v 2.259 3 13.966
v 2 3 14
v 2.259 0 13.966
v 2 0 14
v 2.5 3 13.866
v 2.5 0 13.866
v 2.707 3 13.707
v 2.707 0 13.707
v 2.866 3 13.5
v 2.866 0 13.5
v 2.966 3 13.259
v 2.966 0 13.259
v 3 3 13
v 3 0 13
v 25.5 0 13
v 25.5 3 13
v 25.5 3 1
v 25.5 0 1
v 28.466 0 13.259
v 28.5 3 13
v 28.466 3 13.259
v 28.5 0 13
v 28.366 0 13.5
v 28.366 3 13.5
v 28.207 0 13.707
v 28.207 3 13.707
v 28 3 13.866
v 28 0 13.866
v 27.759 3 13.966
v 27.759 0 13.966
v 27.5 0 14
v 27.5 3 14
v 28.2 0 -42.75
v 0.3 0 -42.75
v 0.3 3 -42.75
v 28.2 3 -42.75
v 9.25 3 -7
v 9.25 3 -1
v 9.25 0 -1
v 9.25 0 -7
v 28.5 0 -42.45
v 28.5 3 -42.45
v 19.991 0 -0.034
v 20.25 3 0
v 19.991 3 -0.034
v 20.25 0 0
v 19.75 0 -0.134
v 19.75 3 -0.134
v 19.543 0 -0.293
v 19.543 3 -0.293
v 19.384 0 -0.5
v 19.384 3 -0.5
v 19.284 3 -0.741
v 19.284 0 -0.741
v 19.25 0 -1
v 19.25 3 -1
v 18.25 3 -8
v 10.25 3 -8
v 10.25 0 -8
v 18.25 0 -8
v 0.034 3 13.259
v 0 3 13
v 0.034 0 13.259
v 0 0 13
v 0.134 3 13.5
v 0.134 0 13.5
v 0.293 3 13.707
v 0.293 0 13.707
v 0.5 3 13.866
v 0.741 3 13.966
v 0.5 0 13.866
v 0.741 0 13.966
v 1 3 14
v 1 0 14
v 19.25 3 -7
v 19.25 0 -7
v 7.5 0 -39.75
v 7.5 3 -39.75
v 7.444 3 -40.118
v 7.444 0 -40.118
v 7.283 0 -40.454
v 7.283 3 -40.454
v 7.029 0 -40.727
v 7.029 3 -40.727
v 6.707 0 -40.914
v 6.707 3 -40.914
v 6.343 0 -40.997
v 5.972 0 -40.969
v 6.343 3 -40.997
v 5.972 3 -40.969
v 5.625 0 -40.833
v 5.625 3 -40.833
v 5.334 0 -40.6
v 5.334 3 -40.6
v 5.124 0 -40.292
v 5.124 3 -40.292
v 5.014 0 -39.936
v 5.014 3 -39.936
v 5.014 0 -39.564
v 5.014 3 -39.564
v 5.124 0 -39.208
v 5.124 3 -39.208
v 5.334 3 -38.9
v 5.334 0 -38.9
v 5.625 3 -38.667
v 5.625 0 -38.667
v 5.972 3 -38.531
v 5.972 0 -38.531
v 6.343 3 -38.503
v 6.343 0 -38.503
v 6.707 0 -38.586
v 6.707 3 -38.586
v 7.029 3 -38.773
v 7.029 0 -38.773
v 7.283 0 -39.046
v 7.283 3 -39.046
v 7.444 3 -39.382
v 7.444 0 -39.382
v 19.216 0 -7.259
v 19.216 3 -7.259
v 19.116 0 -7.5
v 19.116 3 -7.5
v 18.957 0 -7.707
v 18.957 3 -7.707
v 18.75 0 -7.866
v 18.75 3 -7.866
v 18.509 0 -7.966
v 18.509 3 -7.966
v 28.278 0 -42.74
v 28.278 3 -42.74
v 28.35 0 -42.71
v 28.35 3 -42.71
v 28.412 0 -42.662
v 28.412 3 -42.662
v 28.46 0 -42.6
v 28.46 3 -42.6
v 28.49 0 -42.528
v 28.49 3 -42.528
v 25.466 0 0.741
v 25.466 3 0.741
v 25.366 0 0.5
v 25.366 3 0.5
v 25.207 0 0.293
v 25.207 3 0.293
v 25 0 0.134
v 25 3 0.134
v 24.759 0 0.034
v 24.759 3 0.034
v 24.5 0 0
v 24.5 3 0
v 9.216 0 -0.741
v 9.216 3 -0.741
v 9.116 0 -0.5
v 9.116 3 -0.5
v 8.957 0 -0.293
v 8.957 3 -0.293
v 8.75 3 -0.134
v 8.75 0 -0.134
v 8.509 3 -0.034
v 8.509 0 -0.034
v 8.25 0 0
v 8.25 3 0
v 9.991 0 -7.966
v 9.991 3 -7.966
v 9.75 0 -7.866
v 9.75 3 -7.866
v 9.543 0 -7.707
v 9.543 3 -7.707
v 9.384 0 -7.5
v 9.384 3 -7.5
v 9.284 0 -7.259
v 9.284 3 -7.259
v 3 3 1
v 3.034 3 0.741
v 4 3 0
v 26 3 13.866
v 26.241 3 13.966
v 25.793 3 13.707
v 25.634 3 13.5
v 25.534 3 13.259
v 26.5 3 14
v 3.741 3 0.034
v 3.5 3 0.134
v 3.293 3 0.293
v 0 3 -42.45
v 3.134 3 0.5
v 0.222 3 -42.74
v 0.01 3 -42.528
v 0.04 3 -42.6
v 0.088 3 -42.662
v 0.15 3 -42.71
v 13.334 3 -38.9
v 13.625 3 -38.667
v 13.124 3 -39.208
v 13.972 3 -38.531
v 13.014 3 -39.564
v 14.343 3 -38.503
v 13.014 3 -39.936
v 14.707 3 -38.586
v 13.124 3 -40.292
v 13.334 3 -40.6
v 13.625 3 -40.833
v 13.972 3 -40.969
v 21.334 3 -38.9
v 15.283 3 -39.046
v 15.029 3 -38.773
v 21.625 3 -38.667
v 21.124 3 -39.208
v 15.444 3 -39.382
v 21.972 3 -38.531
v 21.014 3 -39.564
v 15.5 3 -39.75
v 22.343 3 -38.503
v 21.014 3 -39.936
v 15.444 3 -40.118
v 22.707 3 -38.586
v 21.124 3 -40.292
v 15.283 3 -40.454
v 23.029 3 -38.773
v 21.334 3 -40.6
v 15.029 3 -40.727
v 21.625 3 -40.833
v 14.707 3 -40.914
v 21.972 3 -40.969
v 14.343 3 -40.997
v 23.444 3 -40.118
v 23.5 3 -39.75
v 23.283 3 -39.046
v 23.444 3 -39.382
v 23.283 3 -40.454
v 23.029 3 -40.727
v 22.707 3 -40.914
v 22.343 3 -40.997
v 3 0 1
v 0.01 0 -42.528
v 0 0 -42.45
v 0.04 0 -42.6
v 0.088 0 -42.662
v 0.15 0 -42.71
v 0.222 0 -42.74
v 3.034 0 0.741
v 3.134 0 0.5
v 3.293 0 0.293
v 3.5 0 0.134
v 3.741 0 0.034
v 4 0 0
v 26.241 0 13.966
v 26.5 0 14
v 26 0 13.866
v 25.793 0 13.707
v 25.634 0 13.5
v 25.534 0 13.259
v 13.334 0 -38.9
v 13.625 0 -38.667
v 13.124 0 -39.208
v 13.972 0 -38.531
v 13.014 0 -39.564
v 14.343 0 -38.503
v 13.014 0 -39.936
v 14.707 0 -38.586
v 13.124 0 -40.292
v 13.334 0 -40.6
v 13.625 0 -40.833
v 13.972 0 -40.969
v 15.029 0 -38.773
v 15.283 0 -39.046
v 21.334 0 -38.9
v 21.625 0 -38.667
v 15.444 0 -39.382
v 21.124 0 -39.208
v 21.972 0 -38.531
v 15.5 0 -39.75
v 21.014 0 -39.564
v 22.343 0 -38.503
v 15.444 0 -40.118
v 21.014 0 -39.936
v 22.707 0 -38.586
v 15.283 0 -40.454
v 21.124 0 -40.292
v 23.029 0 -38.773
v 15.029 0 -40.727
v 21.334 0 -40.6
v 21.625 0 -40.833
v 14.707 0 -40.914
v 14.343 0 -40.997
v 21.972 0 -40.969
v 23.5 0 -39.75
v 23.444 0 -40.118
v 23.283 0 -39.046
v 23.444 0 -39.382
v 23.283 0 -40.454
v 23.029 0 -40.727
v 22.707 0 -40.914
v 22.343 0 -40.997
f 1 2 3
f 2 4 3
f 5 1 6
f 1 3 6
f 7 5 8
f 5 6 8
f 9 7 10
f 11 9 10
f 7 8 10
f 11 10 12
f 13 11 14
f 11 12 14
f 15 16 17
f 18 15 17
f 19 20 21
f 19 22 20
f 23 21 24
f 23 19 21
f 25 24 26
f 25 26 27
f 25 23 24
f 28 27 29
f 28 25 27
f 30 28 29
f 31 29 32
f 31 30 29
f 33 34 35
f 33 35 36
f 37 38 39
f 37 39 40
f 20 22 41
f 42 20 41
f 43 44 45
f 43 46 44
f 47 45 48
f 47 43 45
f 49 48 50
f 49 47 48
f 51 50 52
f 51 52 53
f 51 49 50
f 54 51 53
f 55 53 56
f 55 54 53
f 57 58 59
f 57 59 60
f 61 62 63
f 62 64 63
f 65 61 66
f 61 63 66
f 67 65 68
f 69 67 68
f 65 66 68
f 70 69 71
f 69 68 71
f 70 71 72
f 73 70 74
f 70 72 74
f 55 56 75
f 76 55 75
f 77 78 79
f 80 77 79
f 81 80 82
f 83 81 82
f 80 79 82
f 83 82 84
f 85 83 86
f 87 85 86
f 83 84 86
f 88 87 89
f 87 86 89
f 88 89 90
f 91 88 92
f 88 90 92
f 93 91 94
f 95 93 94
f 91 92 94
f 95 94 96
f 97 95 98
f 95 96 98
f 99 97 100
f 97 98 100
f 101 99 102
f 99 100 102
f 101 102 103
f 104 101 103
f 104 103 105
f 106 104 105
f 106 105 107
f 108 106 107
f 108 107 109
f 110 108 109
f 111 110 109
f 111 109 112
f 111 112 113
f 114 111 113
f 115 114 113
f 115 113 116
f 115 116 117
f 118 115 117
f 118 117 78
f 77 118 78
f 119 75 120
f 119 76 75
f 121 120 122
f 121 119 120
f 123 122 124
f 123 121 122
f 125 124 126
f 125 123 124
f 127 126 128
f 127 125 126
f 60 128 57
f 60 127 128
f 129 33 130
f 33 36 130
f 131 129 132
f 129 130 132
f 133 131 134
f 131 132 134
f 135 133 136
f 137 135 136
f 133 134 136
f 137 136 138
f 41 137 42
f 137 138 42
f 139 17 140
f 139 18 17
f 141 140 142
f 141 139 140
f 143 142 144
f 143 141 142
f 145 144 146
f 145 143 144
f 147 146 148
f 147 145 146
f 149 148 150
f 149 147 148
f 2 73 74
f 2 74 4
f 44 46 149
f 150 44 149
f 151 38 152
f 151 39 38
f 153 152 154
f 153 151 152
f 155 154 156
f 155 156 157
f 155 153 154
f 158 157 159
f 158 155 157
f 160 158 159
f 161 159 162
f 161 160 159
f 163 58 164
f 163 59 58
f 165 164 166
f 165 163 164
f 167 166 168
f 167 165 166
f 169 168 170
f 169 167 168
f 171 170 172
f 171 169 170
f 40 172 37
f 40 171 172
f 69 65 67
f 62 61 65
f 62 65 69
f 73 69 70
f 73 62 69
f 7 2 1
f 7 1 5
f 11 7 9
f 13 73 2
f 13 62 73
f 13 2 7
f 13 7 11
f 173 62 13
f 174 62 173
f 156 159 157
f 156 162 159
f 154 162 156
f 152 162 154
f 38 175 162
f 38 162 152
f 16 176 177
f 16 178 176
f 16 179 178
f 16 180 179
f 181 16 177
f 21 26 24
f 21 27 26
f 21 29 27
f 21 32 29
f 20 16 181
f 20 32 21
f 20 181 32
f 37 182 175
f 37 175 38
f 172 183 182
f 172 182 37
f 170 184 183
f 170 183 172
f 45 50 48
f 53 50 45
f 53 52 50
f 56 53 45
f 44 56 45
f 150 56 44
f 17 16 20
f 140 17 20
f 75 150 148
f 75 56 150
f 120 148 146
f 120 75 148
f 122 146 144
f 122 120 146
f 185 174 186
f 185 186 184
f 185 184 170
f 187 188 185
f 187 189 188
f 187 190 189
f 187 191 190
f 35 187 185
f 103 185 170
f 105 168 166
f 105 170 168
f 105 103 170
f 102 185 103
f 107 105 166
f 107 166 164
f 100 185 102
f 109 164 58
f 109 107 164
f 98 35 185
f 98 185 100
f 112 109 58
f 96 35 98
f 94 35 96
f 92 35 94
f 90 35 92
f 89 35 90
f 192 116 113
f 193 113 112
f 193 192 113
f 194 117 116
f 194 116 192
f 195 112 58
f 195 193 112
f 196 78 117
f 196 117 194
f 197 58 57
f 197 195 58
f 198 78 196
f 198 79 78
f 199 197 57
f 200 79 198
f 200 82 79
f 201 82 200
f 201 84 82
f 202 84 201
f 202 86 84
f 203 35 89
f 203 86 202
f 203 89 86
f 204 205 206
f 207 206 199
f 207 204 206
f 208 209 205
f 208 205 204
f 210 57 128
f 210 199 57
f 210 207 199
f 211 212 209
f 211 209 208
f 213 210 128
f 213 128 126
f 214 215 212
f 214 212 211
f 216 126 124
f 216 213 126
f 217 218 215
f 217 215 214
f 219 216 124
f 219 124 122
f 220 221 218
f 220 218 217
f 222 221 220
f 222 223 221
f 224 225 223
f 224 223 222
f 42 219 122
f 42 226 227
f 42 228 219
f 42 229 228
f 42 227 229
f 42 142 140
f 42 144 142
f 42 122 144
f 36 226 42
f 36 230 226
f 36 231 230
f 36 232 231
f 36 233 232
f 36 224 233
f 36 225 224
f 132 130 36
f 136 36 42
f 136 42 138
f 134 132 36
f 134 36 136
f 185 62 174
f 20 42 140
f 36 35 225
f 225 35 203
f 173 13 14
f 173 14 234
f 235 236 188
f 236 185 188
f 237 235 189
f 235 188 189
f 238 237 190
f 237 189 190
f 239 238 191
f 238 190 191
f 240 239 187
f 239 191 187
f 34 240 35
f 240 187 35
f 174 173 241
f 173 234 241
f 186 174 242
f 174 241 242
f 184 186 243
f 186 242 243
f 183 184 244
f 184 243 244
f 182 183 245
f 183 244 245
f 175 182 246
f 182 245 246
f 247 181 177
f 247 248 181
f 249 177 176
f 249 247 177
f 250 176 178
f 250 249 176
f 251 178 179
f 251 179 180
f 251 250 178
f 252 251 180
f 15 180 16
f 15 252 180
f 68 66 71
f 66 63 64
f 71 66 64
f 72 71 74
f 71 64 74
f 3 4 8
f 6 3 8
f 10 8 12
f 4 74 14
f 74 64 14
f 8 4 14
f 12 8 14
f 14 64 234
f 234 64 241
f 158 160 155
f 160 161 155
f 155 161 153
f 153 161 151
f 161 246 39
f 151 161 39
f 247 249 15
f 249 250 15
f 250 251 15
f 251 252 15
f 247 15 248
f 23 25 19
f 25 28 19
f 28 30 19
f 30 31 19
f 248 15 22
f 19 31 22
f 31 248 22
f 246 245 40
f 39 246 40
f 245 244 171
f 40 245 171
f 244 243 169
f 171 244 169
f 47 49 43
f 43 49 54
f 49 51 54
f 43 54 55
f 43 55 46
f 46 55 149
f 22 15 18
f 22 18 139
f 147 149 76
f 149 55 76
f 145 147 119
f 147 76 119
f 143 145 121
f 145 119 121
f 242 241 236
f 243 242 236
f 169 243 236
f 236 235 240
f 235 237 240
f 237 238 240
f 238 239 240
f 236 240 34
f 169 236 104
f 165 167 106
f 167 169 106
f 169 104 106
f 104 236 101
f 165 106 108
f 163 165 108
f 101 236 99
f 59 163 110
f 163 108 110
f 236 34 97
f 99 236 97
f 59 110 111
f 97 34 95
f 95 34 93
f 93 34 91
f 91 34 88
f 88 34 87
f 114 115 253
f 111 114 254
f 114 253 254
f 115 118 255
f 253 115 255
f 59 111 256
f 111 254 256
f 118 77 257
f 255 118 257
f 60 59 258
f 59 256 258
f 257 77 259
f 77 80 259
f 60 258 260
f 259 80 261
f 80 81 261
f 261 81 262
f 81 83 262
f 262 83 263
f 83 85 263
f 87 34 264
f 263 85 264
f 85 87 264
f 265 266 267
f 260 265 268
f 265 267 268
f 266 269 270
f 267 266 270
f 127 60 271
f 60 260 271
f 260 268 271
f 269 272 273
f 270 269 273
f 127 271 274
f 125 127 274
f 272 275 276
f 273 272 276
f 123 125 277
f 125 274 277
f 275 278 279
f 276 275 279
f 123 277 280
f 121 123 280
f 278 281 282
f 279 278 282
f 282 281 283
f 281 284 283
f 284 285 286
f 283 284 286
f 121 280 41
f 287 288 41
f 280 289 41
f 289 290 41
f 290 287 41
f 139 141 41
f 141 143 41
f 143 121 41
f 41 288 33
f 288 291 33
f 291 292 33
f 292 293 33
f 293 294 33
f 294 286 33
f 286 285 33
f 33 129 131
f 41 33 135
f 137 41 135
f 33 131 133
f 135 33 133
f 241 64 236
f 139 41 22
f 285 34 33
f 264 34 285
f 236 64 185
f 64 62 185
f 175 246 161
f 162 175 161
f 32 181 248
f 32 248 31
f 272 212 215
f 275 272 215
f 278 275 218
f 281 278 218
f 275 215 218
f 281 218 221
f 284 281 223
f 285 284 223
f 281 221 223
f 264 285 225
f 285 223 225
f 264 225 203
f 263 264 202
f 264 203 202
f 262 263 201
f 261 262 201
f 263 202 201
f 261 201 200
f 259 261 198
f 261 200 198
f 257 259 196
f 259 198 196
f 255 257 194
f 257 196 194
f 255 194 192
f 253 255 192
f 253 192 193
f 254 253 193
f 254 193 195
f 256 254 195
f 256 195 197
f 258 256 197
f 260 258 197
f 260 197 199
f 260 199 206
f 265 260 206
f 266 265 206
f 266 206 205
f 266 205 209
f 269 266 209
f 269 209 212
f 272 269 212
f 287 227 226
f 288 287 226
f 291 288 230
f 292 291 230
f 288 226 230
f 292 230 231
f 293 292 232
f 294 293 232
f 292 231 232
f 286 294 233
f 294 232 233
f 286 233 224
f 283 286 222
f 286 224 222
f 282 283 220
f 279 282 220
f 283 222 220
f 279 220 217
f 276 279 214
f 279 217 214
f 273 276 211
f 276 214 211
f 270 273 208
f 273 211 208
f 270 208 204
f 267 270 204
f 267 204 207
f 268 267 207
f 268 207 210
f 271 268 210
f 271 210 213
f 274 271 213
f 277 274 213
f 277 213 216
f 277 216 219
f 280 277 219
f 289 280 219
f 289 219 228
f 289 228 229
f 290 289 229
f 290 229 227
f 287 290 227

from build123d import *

# Parameters (mm, degrees)
SKETCH1_W             = 28.5
SKETCH1_H             = 42.75
BOSS_EXTRUDE1_DEPTH   = 3
M3X0_5_TAPPED_HOLE1_D = 2.5
SKETCH6_W             = 3
SKETCH6_H             = 14
BOSS_EXTRUDE2_DEPTH   = 3
SKETCH7_W             = 10
SKETCH7_H             = 8
CUT_EXTRUDE1_DEPTH    = 52.466615393
FILLET1_R             = 1
FILLET2_R             = 0.3


with BuildPart() as part:
    # Sketch1 → Boss-Extrude1 (new body)
    with BuildSketch(Plane(origin=(0, 0, 0), x_dir=(1, 0, 0), z_dir=(0, 1, 0))):
        with Locations((14.25, 21.375)):
            Rectangle(SKETCH1_W, SKETCH1_H)
    extrude(amount=BOSS_EXTRUDE1_DEPTH)

    # M3x0.5 Tapped Hole1 (through all)
    with Locations(Plane(origin=(0, 0, 0), x_dir=(-1, 0, 0), z_dir=(0, -1, 0))):
        with Locations((-22.25, 39.75), (-14.25, 39.75), (-6.25, 39.75)):
            Hole(M3X0_5_TAPPED_HOLE1_D / 2)

    # Sketch6 → Boss-Extrude2 (add)
    with BuildSketch(Plane(origin=(0, 3, 0), x_dir=(1, 0, 0), z_dir=(0, 1, 0))):
        with Locations((1.5, -7)):
            Rectangle(SKETCH6_W, SKETCH6_H)
        with Locations((27, -7)):
            Rectangle(SKETCH6_W, SKETCH6_H)
    extrude(amount=-BOSS_EXTRUDE2_DEPTH)

    # Sketch7 → Cut-Extrude1 (cut, through all)
    with BuildSketch(Plane(origin=(0, 3, 0), x_dir=(1, 0, 0), z_dir=(0, 1, 0))):
        with Locations((14.25, 4)):
            Rectangle(SKETCH7_W, SKETCH7_H)
    extrude(amount=-CUT_EXTRUDE1_DEPTH, mode=Mode.SUBTRACT)

    # Fillet1
    fillet1_edges = [part.edges().sort_by_distance(p)[0] for p in [
        (3, 1.5, 0),
        (3, 1.5, 14),
        (0, 1.5, 14),
        (25.5, 1.5, 14),
        (25.5, 1.5, 0),
        (28.5, 1.5, 14),
        (19.25, 1.5, -8),
        (19.25, 1.5, 0),
        (9.25, 1.5, 0),
        (9.25, 1.5, -8),
    ]]
    fillet(fillet1_edges, radius=FILLET1_R)

    # Fillet2
    fillet2_edges = [part.edges().sort_by_distance(p)[0] for p in [
        (0, 1.5, -42.75),
        (28.5, 1.5, -42.75),
    ]]
    fillet(fillet2_edges, radius=FILLET2_R)


solid = part.part
